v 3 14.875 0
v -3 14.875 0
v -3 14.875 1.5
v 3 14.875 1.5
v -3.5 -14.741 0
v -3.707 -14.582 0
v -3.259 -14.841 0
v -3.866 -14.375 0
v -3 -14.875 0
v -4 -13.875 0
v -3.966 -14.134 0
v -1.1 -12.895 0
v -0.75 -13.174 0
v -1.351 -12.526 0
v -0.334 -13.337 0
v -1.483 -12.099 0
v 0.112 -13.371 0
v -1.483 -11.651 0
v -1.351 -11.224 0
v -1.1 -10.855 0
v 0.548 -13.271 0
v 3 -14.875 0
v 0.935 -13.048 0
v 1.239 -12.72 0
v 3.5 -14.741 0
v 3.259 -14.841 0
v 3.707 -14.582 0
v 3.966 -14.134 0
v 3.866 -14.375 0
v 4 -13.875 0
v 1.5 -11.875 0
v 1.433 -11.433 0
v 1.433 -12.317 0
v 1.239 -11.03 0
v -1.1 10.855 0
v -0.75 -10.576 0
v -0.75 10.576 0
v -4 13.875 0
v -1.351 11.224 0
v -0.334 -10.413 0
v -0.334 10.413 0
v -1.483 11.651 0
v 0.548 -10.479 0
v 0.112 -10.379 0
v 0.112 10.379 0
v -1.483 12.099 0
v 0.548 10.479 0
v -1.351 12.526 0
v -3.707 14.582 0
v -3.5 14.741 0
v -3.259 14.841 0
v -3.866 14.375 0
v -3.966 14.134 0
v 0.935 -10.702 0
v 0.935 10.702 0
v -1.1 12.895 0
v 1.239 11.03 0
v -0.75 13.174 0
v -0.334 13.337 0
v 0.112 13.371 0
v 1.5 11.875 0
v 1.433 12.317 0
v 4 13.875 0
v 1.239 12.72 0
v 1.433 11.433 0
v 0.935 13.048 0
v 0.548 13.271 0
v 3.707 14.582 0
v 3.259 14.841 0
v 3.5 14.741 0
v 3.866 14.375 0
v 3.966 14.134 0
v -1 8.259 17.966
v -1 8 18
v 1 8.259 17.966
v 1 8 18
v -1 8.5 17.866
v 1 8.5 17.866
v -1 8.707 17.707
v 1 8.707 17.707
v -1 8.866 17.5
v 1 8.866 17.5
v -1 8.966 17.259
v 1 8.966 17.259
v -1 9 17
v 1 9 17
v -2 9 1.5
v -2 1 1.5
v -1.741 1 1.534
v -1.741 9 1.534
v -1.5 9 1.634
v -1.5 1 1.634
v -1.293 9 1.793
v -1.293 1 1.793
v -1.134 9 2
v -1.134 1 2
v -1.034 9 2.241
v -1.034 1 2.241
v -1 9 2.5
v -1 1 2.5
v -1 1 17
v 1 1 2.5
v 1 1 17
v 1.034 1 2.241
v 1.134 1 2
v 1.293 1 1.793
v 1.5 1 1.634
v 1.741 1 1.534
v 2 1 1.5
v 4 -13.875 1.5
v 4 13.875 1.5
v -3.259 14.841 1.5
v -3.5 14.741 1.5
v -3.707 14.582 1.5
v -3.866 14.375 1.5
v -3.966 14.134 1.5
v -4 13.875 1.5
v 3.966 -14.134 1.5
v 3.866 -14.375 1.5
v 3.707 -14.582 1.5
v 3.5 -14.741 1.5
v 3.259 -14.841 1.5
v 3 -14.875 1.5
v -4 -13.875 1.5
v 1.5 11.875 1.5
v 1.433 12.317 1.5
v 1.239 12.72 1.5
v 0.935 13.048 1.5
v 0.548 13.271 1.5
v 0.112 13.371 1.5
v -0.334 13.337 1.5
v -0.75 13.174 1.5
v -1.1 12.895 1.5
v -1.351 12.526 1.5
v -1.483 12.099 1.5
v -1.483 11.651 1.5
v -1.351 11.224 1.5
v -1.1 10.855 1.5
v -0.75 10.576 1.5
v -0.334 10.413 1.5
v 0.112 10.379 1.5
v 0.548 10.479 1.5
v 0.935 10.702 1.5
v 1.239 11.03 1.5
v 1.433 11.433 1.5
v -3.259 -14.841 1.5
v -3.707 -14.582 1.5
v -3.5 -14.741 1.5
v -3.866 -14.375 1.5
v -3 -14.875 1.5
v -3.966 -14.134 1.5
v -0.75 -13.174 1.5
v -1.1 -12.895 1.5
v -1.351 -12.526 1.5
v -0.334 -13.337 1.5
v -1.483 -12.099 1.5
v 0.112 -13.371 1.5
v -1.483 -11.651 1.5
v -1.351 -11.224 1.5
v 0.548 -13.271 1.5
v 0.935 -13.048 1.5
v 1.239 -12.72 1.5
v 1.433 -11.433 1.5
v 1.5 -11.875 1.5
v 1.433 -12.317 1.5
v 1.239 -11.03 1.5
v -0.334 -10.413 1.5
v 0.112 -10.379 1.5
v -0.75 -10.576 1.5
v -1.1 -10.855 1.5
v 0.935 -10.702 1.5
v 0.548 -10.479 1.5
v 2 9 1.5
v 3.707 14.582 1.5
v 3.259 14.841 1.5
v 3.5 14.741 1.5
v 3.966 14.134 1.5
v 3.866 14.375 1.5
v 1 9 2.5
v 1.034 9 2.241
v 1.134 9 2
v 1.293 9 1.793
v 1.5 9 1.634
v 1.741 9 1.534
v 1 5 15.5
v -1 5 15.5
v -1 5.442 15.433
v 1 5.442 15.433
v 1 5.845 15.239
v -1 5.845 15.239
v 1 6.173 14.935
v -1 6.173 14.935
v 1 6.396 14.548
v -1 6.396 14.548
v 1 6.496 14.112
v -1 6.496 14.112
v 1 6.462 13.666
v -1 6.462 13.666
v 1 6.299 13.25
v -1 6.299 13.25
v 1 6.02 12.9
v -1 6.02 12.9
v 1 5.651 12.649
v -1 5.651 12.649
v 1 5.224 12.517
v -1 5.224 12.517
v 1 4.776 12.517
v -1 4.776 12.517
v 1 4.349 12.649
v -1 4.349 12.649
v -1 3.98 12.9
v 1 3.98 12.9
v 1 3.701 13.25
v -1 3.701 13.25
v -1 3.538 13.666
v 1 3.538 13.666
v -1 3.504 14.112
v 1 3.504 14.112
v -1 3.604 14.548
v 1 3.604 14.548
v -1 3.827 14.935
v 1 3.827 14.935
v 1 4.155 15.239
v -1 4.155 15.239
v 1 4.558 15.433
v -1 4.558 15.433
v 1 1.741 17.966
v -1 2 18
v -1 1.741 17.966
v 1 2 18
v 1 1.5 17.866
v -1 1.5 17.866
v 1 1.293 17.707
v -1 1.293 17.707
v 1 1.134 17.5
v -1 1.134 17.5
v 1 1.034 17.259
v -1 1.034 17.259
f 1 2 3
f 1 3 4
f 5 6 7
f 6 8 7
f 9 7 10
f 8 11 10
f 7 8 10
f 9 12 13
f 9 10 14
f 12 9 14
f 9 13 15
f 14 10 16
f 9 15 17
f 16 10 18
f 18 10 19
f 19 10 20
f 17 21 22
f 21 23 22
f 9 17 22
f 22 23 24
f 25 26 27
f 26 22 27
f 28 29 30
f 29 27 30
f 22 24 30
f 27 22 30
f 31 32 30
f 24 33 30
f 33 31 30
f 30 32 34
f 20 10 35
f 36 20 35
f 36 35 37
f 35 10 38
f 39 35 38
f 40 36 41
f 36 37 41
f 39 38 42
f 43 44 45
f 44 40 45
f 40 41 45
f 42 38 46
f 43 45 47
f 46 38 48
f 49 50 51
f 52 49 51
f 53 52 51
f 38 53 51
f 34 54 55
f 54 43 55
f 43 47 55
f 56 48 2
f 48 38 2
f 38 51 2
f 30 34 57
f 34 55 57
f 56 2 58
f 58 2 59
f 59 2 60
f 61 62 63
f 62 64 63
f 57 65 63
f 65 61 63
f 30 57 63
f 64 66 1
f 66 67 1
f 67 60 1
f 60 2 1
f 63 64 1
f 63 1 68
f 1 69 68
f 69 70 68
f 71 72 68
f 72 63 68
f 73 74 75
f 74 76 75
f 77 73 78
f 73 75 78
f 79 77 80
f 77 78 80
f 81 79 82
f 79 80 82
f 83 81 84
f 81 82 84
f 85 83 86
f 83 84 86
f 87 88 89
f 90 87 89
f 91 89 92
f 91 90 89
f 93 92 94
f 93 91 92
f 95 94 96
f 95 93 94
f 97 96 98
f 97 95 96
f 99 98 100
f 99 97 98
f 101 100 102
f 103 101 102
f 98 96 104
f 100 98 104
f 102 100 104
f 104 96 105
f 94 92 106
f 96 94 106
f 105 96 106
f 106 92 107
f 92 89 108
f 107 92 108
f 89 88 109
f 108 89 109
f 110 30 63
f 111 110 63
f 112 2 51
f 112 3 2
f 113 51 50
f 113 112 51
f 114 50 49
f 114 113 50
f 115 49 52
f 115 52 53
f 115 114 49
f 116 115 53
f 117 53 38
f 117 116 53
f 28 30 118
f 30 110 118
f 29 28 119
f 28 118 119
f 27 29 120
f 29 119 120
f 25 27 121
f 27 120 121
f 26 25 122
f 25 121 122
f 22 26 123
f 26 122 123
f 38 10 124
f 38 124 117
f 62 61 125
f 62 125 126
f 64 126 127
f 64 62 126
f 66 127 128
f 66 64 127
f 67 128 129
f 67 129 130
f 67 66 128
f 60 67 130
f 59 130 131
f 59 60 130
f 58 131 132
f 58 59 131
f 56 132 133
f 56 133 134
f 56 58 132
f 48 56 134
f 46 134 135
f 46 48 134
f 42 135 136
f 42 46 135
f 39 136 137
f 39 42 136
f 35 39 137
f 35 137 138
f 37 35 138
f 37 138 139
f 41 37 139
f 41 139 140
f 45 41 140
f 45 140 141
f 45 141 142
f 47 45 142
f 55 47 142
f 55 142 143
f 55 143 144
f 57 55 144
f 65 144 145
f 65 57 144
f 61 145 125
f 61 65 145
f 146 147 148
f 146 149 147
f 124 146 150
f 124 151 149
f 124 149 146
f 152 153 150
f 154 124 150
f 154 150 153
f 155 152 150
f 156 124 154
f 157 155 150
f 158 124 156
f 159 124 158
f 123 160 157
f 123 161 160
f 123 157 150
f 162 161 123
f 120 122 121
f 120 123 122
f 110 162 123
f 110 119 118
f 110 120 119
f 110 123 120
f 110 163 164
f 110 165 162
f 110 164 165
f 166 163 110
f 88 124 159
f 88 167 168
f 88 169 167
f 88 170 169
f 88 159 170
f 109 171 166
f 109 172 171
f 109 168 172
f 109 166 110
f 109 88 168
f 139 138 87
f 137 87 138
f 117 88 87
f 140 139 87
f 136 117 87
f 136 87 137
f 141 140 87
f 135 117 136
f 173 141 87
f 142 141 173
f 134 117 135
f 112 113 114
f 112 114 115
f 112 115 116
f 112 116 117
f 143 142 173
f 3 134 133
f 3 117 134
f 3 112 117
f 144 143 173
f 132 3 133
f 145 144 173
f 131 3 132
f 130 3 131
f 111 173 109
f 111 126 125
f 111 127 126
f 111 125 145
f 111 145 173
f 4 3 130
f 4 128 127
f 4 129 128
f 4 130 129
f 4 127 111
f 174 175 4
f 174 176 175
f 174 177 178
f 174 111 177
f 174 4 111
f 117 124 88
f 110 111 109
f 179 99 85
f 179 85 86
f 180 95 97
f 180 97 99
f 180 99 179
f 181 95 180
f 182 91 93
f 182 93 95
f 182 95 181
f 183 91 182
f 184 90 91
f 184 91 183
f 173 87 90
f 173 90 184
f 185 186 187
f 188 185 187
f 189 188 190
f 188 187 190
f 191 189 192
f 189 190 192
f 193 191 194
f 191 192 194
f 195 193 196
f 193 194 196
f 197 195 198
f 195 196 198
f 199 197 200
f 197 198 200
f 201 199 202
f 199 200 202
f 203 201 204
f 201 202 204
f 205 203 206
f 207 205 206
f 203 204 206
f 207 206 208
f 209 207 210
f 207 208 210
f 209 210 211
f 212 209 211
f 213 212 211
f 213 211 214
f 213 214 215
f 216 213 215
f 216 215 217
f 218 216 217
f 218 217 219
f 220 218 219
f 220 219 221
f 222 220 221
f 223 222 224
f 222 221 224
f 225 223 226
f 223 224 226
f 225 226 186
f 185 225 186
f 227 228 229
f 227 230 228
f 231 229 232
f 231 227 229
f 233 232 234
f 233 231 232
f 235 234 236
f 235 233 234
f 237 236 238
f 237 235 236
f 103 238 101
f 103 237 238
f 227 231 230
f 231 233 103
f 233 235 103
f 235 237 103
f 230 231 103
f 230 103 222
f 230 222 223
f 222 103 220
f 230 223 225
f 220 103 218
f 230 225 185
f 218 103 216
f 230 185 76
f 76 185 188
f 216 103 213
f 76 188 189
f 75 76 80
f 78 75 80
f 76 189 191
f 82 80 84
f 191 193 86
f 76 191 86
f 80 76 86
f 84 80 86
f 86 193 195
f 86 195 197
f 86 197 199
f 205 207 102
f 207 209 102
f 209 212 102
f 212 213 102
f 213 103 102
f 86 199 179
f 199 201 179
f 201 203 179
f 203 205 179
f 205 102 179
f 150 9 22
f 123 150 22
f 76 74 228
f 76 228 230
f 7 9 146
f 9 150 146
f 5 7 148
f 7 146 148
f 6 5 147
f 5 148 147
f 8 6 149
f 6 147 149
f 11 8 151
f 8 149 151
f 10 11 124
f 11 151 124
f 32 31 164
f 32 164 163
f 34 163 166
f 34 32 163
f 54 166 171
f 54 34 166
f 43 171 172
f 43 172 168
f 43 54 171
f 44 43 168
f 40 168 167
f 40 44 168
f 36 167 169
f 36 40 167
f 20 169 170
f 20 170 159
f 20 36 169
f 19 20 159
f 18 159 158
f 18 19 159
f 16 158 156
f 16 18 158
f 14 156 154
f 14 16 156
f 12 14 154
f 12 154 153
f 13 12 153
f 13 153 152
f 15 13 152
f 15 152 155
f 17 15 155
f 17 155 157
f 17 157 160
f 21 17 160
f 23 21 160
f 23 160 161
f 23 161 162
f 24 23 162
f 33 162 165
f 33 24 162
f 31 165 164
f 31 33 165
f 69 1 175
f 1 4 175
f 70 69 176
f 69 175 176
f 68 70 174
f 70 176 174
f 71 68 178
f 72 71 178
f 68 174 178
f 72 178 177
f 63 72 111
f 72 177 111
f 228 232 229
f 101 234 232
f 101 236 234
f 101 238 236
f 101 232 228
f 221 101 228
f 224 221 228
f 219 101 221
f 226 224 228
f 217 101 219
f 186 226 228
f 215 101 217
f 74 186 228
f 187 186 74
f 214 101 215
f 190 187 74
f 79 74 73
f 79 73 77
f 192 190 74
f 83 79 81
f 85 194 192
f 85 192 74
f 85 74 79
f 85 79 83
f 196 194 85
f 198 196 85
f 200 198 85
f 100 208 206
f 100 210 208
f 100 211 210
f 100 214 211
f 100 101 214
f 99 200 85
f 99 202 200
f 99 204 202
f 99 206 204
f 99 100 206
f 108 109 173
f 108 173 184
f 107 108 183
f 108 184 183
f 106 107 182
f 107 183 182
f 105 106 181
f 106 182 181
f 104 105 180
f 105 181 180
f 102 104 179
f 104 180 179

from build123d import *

# Parameters (mm, degrees)
SKETCH_1_W          = 8
SKETCH_1_H          = 29.75
SKETCH_1_R          = 1.5
EXTRUDE_1_DEPTH     = 1.5
SKETCH_2_W          = 2
SKETCH_2_H          = 8
EXTRUDE_2_DEPTH     = 16.5
FILLET_1_R          = 1
FILLET_2_R          = 1
SKETCH_4_R          = 1.5
CUT_EXTRUDE_1_DEPTH = 2


with BuildPart() as part:
    # 草图1 → 凸台-拉伸1 (new body)
    with BuildSketch(Plane.XY):
        Rectangle(SKETCH_1_W, SKETCH_1_H)
        with Locations((0, 11.875)):
            Circle(SKETCH_1_R, mode=Mode.SUBTRACT)
        with Locations((0, -11.875)):
            Circle(SKETCH_1_R, mode=Mode.SUBTRACT)
    extrude(amount=EXTRUDE_1_DEPTH)

    # 草图2 → 凸台-拉伸2 (add)
    with BuildSketch(Plane.XY.offset(1.5)):
        with Locations((0, 5)):
            Rectangle(SKETCH_2_W, SKETCH_2_H)
    extrude(amount=EXTRUDE_2_DEPTH)

    # 圆角1
    fillet_1_edges = [part.edges().sort_by_distance(p)[0] for p in [
        (1, 5, 1.5),
        (-1, 5, 1.5),
    ]]
    fillet(fillet_1_edges, radius=FILLET_1_R)

    # 圆角2
    fillet_2_edges = [part.edges().sort_by_distance(p)[0] for p in [
        (0, 9, 18),
        (0, 1, 18),
        (4, -14.875, 0.75),
        (-4, -14.875, 0.75),
        (-4, 14.875, 0.75),
        (4, 14.875, 0.75),
    ]]
    fillet(fillet_2_edges, radius=FILLET_2_R)

    # 草图4 → 切除-拉伸1 (cut)
    with BuildSketch(Plane.ZY.offset(1)):
        with Locations((14, 5)):
            Circle(SKETCH_4_R)
    extrude(amount=-CUT_EXTRUDE_1_DEPTH, mode=Mode.SUBTRACT)


solid = part.part
